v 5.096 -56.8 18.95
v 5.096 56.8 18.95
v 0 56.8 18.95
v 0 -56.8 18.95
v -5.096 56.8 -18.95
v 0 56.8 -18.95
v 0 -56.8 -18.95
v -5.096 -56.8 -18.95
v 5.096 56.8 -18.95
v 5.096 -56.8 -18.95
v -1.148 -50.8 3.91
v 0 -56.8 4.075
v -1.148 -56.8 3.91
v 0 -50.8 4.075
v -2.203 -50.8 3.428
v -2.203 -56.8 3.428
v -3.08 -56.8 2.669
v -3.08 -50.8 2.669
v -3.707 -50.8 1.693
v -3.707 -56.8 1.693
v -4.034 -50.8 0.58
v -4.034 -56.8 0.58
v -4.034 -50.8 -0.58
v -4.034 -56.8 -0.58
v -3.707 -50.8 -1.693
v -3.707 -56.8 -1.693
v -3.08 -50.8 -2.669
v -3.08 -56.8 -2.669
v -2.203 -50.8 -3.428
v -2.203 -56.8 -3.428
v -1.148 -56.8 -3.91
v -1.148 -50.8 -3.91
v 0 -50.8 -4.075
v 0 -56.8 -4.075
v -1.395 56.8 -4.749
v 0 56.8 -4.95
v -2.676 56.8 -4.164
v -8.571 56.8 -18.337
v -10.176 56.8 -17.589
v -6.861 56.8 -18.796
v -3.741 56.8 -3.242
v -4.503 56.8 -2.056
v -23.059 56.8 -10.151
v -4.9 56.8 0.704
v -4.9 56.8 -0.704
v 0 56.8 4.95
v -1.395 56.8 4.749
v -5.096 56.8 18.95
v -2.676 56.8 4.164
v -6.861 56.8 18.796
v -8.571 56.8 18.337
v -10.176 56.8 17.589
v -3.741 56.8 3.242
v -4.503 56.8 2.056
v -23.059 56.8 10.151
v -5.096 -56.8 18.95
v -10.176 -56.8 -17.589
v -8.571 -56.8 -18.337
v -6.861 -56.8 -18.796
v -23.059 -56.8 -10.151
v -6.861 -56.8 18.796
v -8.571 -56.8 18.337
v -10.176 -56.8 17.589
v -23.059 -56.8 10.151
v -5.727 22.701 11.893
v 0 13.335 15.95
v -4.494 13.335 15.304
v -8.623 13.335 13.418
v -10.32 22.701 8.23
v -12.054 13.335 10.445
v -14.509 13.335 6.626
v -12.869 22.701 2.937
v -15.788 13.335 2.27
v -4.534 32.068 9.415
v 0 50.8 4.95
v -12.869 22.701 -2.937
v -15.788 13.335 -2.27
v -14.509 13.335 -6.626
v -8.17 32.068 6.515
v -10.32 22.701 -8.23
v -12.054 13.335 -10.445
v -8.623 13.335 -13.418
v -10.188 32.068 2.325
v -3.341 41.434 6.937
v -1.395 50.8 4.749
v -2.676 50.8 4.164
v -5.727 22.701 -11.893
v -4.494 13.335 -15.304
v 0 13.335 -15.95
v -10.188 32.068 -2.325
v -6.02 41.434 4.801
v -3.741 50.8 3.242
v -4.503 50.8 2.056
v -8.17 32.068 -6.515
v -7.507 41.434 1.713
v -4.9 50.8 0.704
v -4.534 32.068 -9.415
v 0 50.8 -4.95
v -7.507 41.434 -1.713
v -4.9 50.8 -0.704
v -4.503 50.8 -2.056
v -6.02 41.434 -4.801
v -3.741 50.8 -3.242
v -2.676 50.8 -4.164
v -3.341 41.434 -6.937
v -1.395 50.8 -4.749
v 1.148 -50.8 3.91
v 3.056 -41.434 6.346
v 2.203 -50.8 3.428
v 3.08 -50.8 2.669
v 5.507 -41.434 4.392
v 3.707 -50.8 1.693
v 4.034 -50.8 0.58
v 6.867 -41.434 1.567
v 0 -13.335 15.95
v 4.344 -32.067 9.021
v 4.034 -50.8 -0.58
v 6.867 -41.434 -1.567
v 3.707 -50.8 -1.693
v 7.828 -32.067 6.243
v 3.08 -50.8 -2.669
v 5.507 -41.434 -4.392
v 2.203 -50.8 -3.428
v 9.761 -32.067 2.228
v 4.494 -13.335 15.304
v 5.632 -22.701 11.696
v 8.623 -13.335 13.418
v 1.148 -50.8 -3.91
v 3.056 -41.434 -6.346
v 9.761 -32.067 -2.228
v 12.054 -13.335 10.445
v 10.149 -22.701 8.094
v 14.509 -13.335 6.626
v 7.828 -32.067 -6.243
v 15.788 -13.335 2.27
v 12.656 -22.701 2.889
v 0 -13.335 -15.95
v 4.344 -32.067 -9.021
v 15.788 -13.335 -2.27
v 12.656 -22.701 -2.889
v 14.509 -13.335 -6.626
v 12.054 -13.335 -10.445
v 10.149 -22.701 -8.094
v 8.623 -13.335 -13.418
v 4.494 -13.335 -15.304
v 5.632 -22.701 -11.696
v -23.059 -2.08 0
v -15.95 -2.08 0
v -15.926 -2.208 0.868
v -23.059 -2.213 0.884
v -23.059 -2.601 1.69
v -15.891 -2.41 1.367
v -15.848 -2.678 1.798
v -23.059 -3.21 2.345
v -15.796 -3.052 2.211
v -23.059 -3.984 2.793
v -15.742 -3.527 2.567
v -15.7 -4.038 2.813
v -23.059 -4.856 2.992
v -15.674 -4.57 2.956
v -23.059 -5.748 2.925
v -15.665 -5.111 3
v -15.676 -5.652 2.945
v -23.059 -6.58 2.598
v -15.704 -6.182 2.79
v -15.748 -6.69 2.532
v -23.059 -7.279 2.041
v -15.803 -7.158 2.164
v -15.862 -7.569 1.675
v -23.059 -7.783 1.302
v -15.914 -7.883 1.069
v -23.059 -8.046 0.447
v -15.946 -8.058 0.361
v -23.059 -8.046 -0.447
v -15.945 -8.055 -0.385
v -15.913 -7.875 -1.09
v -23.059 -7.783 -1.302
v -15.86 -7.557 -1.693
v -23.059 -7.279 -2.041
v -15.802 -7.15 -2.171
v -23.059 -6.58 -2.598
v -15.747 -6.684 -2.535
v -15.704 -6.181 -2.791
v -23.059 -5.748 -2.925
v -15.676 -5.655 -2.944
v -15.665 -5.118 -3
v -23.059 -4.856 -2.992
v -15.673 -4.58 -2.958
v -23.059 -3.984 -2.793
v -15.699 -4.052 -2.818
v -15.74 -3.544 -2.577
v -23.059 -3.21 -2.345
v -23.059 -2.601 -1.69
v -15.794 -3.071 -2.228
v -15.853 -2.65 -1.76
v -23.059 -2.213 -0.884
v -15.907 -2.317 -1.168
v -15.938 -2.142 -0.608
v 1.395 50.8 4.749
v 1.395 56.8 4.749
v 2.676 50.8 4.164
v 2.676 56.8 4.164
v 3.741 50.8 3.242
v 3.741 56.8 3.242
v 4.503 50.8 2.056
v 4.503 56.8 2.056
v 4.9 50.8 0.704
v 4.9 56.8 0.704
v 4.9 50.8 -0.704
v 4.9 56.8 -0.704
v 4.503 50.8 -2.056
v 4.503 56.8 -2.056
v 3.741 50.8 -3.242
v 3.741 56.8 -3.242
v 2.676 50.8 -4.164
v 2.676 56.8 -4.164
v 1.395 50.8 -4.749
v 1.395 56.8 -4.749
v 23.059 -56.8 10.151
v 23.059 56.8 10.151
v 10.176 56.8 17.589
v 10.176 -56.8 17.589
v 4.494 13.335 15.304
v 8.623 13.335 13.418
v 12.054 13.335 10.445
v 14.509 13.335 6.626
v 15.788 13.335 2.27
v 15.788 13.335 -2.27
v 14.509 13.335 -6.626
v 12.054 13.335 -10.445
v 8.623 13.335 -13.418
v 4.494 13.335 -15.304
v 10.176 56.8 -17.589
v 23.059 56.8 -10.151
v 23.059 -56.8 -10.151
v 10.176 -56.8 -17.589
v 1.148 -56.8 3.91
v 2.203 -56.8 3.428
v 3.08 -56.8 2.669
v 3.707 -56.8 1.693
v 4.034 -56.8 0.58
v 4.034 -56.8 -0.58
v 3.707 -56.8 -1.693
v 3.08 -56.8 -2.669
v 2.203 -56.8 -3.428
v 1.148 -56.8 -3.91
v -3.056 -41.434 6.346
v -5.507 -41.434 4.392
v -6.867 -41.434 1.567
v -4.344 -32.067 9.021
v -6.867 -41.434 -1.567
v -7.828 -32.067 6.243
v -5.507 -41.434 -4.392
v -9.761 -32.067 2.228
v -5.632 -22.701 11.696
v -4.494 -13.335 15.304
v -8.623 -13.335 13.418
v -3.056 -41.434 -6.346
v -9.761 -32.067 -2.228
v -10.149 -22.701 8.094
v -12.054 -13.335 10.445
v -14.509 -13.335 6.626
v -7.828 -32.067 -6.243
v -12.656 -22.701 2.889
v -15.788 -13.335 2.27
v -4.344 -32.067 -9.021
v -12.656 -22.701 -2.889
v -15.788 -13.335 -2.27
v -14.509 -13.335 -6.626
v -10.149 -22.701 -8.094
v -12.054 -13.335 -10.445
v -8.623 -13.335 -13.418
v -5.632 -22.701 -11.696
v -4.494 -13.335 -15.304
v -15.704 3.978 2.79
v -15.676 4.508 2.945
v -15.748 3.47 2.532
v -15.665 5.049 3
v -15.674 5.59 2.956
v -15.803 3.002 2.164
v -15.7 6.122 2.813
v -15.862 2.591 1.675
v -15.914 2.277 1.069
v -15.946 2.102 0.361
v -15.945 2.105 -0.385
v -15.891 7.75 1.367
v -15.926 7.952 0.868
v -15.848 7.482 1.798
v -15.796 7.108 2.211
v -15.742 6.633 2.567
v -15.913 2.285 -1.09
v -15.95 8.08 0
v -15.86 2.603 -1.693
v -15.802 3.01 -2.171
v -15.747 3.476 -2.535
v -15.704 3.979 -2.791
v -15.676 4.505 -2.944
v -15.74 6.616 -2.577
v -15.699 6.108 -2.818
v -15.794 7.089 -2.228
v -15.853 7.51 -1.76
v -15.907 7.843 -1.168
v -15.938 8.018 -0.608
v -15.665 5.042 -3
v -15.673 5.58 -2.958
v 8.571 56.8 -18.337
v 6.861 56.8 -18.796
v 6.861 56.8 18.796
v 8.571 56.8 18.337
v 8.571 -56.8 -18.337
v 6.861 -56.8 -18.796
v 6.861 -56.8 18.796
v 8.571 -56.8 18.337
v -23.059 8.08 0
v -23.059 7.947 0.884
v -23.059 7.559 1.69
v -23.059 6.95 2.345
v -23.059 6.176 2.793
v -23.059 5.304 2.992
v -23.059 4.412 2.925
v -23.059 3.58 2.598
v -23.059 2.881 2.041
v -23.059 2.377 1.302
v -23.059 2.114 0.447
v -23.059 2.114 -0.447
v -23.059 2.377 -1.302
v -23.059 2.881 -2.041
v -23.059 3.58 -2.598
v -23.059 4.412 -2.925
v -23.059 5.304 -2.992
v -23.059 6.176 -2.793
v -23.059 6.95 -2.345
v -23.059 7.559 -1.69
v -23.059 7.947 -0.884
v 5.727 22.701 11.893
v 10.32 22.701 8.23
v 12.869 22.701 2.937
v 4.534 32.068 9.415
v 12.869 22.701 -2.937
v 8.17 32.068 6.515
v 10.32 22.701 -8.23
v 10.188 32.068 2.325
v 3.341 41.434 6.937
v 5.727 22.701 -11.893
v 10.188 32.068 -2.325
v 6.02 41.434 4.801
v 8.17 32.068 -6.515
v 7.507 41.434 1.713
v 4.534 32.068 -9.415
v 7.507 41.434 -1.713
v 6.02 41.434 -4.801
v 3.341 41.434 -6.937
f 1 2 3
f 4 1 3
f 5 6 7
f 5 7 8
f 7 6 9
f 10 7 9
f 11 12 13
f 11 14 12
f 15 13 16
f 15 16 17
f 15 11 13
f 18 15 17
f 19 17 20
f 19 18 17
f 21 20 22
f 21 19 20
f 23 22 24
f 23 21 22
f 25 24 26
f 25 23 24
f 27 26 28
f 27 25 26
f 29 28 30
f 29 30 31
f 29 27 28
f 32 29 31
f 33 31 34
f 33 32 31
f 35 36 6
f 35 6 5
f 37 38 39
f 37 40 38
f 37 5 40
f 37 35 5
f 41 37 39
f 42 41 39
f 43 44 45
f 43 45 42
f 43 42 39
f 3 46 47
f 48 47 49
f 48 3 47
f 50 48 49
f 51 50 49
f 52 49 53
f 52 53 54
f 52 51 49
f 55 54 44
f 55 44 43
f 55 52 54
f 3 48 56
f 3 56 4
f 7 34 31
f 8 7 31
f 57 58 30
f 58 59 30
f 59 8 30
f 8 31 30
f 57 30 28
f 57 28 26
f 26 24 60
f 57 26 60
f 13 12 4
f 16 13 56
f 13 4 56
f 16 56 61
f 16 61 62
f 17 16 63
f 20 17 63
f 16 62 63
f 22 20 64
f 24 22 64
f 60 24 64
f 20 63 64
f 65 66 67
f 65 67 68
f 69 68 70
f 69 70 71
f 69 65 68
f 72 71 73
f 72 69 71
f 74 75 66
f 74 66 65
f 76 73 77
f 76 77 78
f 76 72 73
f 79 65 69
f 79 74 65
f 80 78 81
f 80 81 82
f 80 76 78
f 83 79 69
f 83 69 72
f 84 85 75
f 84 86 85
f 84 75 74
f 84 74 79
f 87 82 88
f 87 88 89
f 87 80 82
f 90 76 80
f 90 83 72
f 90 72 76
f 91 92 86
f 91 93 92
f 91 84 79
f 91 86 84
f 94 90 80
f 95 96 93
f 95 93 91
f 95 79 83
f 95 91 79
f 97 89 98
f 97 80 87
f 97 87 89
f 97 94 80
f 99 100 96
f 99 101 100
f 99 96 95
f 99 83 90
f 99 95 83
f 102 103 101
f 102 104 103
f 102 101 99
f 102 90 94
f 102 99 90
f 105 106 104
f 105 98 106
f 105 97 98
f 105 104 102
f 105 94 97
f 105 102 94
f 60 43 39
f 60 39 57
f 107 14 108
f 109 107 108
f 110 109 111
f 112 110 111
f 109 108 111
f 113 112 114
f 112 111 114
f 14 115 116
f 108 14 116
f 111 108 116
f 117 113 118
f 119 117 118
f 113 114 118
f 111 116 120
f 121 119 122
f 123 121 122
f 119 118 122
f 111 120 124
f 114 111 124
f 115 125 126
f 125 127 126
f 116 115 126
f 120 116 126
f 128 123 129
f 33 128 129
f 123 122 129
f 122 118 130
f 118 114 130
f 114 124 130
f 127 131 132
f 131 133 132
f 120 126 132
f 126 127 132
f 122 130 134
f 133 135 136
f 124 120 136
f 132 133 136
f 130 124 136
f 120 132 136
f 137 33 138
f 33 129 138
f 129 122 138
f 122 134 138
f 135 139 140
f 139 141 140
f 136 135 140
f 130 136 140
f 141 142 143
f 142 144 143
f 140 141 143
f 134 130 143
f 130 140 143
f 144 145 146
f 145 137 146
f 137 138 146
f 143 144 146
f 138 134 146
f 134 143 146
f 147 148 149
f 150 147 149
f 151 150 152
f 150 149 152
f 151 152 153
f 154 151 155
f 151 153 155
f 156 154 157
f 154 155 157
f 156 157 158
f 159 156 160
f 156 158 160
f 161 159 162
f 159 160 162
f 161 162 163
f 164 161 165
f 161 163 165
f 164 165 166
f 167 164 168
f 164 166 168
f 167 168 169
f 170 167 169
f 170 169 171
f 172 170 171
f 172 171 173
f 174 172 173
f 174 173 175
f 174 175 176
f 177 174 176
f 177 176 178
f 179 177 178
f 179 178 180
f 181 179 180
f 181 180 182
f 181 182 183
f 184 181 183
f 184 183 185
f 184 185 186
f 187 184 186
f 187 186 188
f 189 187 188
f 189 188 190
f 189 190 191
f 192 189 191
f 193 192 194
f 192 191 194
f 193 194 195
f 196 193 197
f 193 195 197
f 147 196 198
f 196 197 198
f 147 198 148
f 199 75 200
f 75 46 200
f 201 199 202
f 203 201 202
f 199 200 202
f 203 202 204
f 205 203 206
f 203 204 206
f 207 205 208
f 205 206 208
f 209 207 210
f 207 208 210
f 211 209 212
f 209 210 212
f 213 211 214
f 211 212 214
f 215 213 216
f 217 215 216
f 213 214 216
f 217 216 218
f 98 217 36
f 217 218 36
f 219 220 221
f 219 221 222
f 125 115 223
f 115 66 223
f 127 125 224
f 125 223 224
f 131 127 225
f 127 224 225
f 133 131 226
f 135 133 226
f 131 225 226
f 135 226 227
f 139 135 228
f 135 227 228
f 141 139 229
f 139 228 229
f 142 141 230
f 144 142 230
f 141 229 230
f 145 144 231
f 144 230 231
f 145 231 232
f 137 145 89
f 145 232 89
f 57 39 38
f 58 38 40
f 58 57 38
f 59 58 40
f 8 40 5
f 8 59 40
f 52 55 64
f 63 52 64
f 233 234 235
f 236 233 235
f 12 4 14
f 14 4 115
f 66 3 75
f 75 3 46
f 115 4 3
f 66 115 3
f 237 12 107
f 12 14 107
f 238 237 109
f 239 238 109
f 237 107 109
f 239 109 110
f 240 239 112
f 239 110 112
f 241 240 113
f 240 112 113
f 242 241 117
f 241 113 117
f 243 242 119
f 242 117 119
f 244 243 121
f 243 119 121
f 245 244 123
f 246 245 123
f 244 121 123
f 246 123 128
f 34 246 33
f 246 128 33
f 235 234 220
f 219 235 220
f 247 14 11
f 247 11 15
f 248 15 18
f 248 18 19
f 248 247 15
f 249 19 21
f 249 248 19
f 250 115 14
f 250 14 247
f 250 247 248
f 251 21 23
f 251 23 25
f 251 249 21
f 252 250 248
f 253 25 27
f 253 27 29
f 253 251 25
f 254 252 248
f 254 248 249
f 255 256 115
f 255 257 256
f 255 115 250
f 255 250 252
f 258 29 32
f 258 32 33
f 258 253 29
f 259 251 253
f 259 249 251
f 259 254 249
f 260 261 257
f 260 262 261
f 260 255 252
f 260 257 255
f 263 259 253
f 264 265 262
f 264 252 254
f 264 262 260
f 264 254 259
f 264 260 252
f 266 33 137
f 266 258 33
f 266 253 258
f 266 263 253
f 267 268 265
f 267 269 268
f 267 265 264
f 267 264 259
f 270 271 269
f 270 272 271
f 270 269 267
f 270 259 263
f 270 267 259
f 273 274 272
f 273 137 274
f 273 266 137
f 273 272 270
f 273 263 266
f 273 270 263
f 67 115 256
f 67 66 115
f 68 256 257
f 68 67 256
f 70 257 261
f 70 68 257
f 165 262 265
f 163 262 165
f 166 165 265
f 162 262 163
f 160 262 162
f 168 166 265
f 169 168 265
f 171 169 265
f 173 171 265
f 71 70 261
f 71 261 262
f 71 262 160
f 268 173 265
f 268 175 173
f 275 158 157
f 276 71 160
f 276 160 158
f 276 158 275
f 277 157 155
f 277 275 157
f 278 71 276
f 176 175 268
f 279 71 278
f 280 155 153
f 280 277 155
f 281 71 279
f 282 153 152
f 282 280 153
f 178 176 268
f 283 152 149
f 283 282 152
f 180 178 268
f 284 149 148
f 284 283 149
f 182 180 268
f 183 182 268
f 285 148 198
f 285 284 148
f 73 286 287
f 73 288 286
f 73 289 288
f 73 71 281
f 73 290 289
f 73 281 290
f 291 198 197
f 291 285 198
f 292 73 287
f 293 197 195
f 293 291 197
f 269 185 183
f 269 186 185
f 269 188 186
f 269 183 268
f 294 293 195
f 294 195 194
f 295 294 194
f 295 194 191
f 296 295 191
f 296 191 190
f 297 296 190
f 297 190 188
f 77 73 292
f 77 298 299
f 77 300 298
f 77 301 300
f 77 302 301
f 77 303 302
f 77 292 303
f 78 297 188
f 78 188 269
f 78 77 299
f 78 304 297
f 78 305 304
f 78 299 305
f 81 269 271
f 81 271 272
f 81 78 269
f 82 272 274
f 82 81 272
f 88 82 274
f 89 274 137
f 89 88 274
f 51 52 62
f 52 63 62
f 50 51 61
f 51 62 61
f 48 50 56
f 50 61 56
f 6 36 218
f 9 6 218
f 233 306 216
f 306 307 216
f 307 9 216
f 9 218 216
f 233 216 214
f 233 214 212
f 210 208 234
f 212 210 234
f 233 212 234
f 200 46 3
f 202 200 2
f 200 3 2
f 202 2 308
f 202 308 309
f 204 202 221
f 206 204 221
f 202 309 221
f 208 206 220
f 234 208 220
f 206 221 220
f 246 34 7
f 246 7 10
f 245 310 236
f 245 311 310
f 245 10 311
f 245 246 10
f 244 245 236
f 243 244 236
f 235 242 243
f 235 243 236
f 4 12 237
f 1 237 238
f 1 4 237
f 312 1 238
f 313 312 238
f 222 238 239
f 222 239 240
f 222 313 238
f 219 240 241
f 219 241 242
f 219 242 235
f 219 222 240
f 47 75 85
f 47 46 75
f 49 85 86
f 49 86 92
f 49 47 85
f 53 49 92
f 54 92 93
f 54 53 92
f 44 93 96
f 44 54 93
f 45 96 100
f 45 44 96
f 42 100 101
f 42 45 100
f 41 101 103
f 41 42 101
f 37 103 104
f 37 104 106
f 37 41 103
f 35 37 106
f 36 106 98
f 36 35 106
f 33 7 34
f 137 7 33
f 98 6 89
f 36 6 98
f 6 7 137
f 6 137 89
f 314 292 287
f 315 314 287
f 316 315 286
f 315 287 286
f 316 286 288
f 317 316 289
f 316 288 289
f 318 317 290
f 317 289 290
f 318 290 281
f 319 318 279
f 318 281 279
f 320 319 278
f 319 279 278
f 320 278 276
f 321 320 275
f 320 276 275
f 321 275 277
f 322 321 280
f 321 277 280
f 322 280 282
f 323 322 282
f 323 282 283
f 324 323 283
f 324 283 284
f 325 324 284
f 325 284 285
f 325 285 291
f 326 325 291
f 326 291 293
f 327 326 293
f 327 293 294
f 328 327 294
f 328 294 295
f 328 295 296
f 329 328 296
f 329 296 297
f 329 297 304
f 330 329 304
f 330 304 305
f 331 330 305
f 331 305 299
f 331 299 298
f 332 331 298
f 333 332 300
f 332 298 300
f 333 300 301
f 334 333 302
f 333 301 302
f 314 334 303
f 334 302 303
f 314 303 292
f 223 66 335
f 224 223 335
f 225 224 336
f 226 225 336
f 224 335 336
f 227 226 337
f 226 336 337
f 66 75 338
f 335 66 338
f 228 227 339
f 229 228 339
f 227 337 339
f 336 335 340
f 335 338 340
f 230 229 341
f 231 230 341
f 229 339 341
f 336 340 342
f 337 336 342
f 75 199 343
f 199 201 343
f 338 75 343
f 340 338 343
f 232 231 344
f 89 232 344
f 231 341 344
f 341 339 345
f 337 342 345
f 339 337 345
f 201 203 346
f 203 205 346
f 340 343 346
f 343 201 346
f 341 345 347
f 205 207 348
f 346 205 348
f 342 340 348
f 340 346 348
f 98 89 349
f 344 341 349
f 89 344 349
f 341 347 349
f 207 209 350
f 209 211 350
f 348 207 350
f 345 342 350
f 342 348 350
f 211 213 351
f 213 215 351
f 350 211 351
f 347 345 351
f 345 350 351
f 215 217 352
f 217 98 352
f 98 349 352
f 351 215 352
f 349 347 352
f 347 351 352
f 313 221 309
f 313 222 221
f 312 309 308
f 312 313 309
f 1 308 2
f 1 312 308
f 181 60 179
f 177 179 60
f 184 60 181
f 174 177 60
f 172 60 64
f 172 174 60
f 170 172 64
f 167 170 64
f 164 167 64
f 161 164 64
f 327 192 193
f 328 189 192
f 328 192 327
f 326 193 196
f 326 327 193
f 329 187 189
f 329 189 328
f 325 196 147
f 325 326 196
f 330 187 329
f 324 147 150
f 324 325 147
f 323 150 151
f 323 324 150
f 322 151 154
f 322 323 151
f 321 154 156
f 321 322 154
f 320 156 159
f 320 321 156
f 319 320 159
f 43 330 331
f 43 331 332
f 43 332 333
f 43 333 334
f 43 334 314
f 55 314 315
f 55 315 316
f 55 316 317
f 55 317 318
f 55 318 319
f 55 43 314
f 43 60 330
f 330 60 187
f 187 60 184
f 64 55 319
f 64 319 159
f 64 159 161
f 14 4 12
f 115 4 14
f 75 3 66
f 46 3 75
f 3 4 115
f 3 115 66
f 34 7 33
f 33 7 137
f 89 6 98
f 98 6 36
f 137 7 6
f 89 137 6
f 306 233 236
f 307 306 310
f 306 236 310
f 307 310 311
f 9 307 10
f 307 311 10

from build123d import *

# Parameters (mm, degrees)
F1_ANGLE_BACK = 90
F1_ANGLE      = 180
F3_DEPTH      = 113.6
F5_SIZE2      = 8.7988181024
F5_SIZE       = 15.24
F5_2_SIZE2    = 8.7988181024
F5_2_SIZE     = 15.24
F6_R          = 10.16
F7_R          = 3
F10_DEPTH     = 23.0597814003


with BuildPart() as f1:
    # F0 (on Top) → F1 (revolve)
    with BuildSketch(Plane.XY, mode=Mode.PRIVATE) as f1_sk:
        Polygon((-15.95, 13.335), (-4.95, 50.8), (-4.95, 56.8), (-18.95, 56.8), (-18.95, -56.8), (-4.075, -56.8), (-4.075, -50.8), (-15.95, -13.335), (-15.95, 0), align=None)
    revolve(f1_sk.sketch.rotate(Axis((0, 0.9961221367, 0), (0, -1, 0)), -F1_ANGLE_BACK), axis=Axis((0, 0.9961221367, 0), (0, -1, 0)), revolution_arc=F1_ANGLE)

    # F2 (on face) → F3 (join, through all)
    with BuildSketch(Plane(origin=(0, 56.8, 0), x_dir=(-1, 0, 0), z_dir=(0, 1, 0))):
        with BuildLine():
            Line((23.0587814003, 18.95), (0, 18.95))
            ThreePointArc((0, 18.95), (18.95, 0), (0, -18.95))
            Line((0, -18.95), (23.0587814003, -18.95))
            Line((23.0587814003, -18.95), (23.0587814003, 18.95))
        make_face()
    extrude(amount=-F3_DEPTH)

    # F5
    f5_edges = [f1.edges().sort_by_distance(p)[0] for p in [
        (-23.058781, 0, -18.95),
    ]]
    f5_side = f1.faces().sort_by_distance((-11.529391, 0, -18.95))[0]
    chamfer(f5_edges, length=F5_SIZE, length2=F5_SIZE2, reference=f5_side)

    # F5#2
    f5_2_edges = [f1.edges().sort_by_distance(p)[0] for p in [
        (-23.058781, 0, 18.95),
    ]]
    f5_2_side = f1.faces().sort_by_distance((-11.529391, 0, 18.95))[0]
    chamfer(f5_2_edges, length=F5_2_SIZE, length2=F5_2_SIZE2, reference=f5_2_side)

    # F6
    f6_edges = [f1.edges().sort_by_distance(p)[0] for p in [
        (-7.818781, 0, 18.95),
        (-7.818781, 0, -18.95),
    ]]
    fillet(f6_edges, radius=F6_R)


with BuildPart() as f9_1:
    # F9: instance of F1
    add(f1.part.mirror(Plane.YZ))


with BuildPart() as f1_1:
    add(f1.part)

    # F7 (on face) → F10 (cut, through all)
    with BuildSketch(Plane.YZ):
        with Locations((-5.08, 0)):
            Circle(F7_R)
        with Locations((5.08, 0)):
            Circle(F7_R)
    extrude(amount=-F10_DEPTH, mode=Mode.SUBTRACT)


solid = Compound([f9_1.part, f1_1.part])
